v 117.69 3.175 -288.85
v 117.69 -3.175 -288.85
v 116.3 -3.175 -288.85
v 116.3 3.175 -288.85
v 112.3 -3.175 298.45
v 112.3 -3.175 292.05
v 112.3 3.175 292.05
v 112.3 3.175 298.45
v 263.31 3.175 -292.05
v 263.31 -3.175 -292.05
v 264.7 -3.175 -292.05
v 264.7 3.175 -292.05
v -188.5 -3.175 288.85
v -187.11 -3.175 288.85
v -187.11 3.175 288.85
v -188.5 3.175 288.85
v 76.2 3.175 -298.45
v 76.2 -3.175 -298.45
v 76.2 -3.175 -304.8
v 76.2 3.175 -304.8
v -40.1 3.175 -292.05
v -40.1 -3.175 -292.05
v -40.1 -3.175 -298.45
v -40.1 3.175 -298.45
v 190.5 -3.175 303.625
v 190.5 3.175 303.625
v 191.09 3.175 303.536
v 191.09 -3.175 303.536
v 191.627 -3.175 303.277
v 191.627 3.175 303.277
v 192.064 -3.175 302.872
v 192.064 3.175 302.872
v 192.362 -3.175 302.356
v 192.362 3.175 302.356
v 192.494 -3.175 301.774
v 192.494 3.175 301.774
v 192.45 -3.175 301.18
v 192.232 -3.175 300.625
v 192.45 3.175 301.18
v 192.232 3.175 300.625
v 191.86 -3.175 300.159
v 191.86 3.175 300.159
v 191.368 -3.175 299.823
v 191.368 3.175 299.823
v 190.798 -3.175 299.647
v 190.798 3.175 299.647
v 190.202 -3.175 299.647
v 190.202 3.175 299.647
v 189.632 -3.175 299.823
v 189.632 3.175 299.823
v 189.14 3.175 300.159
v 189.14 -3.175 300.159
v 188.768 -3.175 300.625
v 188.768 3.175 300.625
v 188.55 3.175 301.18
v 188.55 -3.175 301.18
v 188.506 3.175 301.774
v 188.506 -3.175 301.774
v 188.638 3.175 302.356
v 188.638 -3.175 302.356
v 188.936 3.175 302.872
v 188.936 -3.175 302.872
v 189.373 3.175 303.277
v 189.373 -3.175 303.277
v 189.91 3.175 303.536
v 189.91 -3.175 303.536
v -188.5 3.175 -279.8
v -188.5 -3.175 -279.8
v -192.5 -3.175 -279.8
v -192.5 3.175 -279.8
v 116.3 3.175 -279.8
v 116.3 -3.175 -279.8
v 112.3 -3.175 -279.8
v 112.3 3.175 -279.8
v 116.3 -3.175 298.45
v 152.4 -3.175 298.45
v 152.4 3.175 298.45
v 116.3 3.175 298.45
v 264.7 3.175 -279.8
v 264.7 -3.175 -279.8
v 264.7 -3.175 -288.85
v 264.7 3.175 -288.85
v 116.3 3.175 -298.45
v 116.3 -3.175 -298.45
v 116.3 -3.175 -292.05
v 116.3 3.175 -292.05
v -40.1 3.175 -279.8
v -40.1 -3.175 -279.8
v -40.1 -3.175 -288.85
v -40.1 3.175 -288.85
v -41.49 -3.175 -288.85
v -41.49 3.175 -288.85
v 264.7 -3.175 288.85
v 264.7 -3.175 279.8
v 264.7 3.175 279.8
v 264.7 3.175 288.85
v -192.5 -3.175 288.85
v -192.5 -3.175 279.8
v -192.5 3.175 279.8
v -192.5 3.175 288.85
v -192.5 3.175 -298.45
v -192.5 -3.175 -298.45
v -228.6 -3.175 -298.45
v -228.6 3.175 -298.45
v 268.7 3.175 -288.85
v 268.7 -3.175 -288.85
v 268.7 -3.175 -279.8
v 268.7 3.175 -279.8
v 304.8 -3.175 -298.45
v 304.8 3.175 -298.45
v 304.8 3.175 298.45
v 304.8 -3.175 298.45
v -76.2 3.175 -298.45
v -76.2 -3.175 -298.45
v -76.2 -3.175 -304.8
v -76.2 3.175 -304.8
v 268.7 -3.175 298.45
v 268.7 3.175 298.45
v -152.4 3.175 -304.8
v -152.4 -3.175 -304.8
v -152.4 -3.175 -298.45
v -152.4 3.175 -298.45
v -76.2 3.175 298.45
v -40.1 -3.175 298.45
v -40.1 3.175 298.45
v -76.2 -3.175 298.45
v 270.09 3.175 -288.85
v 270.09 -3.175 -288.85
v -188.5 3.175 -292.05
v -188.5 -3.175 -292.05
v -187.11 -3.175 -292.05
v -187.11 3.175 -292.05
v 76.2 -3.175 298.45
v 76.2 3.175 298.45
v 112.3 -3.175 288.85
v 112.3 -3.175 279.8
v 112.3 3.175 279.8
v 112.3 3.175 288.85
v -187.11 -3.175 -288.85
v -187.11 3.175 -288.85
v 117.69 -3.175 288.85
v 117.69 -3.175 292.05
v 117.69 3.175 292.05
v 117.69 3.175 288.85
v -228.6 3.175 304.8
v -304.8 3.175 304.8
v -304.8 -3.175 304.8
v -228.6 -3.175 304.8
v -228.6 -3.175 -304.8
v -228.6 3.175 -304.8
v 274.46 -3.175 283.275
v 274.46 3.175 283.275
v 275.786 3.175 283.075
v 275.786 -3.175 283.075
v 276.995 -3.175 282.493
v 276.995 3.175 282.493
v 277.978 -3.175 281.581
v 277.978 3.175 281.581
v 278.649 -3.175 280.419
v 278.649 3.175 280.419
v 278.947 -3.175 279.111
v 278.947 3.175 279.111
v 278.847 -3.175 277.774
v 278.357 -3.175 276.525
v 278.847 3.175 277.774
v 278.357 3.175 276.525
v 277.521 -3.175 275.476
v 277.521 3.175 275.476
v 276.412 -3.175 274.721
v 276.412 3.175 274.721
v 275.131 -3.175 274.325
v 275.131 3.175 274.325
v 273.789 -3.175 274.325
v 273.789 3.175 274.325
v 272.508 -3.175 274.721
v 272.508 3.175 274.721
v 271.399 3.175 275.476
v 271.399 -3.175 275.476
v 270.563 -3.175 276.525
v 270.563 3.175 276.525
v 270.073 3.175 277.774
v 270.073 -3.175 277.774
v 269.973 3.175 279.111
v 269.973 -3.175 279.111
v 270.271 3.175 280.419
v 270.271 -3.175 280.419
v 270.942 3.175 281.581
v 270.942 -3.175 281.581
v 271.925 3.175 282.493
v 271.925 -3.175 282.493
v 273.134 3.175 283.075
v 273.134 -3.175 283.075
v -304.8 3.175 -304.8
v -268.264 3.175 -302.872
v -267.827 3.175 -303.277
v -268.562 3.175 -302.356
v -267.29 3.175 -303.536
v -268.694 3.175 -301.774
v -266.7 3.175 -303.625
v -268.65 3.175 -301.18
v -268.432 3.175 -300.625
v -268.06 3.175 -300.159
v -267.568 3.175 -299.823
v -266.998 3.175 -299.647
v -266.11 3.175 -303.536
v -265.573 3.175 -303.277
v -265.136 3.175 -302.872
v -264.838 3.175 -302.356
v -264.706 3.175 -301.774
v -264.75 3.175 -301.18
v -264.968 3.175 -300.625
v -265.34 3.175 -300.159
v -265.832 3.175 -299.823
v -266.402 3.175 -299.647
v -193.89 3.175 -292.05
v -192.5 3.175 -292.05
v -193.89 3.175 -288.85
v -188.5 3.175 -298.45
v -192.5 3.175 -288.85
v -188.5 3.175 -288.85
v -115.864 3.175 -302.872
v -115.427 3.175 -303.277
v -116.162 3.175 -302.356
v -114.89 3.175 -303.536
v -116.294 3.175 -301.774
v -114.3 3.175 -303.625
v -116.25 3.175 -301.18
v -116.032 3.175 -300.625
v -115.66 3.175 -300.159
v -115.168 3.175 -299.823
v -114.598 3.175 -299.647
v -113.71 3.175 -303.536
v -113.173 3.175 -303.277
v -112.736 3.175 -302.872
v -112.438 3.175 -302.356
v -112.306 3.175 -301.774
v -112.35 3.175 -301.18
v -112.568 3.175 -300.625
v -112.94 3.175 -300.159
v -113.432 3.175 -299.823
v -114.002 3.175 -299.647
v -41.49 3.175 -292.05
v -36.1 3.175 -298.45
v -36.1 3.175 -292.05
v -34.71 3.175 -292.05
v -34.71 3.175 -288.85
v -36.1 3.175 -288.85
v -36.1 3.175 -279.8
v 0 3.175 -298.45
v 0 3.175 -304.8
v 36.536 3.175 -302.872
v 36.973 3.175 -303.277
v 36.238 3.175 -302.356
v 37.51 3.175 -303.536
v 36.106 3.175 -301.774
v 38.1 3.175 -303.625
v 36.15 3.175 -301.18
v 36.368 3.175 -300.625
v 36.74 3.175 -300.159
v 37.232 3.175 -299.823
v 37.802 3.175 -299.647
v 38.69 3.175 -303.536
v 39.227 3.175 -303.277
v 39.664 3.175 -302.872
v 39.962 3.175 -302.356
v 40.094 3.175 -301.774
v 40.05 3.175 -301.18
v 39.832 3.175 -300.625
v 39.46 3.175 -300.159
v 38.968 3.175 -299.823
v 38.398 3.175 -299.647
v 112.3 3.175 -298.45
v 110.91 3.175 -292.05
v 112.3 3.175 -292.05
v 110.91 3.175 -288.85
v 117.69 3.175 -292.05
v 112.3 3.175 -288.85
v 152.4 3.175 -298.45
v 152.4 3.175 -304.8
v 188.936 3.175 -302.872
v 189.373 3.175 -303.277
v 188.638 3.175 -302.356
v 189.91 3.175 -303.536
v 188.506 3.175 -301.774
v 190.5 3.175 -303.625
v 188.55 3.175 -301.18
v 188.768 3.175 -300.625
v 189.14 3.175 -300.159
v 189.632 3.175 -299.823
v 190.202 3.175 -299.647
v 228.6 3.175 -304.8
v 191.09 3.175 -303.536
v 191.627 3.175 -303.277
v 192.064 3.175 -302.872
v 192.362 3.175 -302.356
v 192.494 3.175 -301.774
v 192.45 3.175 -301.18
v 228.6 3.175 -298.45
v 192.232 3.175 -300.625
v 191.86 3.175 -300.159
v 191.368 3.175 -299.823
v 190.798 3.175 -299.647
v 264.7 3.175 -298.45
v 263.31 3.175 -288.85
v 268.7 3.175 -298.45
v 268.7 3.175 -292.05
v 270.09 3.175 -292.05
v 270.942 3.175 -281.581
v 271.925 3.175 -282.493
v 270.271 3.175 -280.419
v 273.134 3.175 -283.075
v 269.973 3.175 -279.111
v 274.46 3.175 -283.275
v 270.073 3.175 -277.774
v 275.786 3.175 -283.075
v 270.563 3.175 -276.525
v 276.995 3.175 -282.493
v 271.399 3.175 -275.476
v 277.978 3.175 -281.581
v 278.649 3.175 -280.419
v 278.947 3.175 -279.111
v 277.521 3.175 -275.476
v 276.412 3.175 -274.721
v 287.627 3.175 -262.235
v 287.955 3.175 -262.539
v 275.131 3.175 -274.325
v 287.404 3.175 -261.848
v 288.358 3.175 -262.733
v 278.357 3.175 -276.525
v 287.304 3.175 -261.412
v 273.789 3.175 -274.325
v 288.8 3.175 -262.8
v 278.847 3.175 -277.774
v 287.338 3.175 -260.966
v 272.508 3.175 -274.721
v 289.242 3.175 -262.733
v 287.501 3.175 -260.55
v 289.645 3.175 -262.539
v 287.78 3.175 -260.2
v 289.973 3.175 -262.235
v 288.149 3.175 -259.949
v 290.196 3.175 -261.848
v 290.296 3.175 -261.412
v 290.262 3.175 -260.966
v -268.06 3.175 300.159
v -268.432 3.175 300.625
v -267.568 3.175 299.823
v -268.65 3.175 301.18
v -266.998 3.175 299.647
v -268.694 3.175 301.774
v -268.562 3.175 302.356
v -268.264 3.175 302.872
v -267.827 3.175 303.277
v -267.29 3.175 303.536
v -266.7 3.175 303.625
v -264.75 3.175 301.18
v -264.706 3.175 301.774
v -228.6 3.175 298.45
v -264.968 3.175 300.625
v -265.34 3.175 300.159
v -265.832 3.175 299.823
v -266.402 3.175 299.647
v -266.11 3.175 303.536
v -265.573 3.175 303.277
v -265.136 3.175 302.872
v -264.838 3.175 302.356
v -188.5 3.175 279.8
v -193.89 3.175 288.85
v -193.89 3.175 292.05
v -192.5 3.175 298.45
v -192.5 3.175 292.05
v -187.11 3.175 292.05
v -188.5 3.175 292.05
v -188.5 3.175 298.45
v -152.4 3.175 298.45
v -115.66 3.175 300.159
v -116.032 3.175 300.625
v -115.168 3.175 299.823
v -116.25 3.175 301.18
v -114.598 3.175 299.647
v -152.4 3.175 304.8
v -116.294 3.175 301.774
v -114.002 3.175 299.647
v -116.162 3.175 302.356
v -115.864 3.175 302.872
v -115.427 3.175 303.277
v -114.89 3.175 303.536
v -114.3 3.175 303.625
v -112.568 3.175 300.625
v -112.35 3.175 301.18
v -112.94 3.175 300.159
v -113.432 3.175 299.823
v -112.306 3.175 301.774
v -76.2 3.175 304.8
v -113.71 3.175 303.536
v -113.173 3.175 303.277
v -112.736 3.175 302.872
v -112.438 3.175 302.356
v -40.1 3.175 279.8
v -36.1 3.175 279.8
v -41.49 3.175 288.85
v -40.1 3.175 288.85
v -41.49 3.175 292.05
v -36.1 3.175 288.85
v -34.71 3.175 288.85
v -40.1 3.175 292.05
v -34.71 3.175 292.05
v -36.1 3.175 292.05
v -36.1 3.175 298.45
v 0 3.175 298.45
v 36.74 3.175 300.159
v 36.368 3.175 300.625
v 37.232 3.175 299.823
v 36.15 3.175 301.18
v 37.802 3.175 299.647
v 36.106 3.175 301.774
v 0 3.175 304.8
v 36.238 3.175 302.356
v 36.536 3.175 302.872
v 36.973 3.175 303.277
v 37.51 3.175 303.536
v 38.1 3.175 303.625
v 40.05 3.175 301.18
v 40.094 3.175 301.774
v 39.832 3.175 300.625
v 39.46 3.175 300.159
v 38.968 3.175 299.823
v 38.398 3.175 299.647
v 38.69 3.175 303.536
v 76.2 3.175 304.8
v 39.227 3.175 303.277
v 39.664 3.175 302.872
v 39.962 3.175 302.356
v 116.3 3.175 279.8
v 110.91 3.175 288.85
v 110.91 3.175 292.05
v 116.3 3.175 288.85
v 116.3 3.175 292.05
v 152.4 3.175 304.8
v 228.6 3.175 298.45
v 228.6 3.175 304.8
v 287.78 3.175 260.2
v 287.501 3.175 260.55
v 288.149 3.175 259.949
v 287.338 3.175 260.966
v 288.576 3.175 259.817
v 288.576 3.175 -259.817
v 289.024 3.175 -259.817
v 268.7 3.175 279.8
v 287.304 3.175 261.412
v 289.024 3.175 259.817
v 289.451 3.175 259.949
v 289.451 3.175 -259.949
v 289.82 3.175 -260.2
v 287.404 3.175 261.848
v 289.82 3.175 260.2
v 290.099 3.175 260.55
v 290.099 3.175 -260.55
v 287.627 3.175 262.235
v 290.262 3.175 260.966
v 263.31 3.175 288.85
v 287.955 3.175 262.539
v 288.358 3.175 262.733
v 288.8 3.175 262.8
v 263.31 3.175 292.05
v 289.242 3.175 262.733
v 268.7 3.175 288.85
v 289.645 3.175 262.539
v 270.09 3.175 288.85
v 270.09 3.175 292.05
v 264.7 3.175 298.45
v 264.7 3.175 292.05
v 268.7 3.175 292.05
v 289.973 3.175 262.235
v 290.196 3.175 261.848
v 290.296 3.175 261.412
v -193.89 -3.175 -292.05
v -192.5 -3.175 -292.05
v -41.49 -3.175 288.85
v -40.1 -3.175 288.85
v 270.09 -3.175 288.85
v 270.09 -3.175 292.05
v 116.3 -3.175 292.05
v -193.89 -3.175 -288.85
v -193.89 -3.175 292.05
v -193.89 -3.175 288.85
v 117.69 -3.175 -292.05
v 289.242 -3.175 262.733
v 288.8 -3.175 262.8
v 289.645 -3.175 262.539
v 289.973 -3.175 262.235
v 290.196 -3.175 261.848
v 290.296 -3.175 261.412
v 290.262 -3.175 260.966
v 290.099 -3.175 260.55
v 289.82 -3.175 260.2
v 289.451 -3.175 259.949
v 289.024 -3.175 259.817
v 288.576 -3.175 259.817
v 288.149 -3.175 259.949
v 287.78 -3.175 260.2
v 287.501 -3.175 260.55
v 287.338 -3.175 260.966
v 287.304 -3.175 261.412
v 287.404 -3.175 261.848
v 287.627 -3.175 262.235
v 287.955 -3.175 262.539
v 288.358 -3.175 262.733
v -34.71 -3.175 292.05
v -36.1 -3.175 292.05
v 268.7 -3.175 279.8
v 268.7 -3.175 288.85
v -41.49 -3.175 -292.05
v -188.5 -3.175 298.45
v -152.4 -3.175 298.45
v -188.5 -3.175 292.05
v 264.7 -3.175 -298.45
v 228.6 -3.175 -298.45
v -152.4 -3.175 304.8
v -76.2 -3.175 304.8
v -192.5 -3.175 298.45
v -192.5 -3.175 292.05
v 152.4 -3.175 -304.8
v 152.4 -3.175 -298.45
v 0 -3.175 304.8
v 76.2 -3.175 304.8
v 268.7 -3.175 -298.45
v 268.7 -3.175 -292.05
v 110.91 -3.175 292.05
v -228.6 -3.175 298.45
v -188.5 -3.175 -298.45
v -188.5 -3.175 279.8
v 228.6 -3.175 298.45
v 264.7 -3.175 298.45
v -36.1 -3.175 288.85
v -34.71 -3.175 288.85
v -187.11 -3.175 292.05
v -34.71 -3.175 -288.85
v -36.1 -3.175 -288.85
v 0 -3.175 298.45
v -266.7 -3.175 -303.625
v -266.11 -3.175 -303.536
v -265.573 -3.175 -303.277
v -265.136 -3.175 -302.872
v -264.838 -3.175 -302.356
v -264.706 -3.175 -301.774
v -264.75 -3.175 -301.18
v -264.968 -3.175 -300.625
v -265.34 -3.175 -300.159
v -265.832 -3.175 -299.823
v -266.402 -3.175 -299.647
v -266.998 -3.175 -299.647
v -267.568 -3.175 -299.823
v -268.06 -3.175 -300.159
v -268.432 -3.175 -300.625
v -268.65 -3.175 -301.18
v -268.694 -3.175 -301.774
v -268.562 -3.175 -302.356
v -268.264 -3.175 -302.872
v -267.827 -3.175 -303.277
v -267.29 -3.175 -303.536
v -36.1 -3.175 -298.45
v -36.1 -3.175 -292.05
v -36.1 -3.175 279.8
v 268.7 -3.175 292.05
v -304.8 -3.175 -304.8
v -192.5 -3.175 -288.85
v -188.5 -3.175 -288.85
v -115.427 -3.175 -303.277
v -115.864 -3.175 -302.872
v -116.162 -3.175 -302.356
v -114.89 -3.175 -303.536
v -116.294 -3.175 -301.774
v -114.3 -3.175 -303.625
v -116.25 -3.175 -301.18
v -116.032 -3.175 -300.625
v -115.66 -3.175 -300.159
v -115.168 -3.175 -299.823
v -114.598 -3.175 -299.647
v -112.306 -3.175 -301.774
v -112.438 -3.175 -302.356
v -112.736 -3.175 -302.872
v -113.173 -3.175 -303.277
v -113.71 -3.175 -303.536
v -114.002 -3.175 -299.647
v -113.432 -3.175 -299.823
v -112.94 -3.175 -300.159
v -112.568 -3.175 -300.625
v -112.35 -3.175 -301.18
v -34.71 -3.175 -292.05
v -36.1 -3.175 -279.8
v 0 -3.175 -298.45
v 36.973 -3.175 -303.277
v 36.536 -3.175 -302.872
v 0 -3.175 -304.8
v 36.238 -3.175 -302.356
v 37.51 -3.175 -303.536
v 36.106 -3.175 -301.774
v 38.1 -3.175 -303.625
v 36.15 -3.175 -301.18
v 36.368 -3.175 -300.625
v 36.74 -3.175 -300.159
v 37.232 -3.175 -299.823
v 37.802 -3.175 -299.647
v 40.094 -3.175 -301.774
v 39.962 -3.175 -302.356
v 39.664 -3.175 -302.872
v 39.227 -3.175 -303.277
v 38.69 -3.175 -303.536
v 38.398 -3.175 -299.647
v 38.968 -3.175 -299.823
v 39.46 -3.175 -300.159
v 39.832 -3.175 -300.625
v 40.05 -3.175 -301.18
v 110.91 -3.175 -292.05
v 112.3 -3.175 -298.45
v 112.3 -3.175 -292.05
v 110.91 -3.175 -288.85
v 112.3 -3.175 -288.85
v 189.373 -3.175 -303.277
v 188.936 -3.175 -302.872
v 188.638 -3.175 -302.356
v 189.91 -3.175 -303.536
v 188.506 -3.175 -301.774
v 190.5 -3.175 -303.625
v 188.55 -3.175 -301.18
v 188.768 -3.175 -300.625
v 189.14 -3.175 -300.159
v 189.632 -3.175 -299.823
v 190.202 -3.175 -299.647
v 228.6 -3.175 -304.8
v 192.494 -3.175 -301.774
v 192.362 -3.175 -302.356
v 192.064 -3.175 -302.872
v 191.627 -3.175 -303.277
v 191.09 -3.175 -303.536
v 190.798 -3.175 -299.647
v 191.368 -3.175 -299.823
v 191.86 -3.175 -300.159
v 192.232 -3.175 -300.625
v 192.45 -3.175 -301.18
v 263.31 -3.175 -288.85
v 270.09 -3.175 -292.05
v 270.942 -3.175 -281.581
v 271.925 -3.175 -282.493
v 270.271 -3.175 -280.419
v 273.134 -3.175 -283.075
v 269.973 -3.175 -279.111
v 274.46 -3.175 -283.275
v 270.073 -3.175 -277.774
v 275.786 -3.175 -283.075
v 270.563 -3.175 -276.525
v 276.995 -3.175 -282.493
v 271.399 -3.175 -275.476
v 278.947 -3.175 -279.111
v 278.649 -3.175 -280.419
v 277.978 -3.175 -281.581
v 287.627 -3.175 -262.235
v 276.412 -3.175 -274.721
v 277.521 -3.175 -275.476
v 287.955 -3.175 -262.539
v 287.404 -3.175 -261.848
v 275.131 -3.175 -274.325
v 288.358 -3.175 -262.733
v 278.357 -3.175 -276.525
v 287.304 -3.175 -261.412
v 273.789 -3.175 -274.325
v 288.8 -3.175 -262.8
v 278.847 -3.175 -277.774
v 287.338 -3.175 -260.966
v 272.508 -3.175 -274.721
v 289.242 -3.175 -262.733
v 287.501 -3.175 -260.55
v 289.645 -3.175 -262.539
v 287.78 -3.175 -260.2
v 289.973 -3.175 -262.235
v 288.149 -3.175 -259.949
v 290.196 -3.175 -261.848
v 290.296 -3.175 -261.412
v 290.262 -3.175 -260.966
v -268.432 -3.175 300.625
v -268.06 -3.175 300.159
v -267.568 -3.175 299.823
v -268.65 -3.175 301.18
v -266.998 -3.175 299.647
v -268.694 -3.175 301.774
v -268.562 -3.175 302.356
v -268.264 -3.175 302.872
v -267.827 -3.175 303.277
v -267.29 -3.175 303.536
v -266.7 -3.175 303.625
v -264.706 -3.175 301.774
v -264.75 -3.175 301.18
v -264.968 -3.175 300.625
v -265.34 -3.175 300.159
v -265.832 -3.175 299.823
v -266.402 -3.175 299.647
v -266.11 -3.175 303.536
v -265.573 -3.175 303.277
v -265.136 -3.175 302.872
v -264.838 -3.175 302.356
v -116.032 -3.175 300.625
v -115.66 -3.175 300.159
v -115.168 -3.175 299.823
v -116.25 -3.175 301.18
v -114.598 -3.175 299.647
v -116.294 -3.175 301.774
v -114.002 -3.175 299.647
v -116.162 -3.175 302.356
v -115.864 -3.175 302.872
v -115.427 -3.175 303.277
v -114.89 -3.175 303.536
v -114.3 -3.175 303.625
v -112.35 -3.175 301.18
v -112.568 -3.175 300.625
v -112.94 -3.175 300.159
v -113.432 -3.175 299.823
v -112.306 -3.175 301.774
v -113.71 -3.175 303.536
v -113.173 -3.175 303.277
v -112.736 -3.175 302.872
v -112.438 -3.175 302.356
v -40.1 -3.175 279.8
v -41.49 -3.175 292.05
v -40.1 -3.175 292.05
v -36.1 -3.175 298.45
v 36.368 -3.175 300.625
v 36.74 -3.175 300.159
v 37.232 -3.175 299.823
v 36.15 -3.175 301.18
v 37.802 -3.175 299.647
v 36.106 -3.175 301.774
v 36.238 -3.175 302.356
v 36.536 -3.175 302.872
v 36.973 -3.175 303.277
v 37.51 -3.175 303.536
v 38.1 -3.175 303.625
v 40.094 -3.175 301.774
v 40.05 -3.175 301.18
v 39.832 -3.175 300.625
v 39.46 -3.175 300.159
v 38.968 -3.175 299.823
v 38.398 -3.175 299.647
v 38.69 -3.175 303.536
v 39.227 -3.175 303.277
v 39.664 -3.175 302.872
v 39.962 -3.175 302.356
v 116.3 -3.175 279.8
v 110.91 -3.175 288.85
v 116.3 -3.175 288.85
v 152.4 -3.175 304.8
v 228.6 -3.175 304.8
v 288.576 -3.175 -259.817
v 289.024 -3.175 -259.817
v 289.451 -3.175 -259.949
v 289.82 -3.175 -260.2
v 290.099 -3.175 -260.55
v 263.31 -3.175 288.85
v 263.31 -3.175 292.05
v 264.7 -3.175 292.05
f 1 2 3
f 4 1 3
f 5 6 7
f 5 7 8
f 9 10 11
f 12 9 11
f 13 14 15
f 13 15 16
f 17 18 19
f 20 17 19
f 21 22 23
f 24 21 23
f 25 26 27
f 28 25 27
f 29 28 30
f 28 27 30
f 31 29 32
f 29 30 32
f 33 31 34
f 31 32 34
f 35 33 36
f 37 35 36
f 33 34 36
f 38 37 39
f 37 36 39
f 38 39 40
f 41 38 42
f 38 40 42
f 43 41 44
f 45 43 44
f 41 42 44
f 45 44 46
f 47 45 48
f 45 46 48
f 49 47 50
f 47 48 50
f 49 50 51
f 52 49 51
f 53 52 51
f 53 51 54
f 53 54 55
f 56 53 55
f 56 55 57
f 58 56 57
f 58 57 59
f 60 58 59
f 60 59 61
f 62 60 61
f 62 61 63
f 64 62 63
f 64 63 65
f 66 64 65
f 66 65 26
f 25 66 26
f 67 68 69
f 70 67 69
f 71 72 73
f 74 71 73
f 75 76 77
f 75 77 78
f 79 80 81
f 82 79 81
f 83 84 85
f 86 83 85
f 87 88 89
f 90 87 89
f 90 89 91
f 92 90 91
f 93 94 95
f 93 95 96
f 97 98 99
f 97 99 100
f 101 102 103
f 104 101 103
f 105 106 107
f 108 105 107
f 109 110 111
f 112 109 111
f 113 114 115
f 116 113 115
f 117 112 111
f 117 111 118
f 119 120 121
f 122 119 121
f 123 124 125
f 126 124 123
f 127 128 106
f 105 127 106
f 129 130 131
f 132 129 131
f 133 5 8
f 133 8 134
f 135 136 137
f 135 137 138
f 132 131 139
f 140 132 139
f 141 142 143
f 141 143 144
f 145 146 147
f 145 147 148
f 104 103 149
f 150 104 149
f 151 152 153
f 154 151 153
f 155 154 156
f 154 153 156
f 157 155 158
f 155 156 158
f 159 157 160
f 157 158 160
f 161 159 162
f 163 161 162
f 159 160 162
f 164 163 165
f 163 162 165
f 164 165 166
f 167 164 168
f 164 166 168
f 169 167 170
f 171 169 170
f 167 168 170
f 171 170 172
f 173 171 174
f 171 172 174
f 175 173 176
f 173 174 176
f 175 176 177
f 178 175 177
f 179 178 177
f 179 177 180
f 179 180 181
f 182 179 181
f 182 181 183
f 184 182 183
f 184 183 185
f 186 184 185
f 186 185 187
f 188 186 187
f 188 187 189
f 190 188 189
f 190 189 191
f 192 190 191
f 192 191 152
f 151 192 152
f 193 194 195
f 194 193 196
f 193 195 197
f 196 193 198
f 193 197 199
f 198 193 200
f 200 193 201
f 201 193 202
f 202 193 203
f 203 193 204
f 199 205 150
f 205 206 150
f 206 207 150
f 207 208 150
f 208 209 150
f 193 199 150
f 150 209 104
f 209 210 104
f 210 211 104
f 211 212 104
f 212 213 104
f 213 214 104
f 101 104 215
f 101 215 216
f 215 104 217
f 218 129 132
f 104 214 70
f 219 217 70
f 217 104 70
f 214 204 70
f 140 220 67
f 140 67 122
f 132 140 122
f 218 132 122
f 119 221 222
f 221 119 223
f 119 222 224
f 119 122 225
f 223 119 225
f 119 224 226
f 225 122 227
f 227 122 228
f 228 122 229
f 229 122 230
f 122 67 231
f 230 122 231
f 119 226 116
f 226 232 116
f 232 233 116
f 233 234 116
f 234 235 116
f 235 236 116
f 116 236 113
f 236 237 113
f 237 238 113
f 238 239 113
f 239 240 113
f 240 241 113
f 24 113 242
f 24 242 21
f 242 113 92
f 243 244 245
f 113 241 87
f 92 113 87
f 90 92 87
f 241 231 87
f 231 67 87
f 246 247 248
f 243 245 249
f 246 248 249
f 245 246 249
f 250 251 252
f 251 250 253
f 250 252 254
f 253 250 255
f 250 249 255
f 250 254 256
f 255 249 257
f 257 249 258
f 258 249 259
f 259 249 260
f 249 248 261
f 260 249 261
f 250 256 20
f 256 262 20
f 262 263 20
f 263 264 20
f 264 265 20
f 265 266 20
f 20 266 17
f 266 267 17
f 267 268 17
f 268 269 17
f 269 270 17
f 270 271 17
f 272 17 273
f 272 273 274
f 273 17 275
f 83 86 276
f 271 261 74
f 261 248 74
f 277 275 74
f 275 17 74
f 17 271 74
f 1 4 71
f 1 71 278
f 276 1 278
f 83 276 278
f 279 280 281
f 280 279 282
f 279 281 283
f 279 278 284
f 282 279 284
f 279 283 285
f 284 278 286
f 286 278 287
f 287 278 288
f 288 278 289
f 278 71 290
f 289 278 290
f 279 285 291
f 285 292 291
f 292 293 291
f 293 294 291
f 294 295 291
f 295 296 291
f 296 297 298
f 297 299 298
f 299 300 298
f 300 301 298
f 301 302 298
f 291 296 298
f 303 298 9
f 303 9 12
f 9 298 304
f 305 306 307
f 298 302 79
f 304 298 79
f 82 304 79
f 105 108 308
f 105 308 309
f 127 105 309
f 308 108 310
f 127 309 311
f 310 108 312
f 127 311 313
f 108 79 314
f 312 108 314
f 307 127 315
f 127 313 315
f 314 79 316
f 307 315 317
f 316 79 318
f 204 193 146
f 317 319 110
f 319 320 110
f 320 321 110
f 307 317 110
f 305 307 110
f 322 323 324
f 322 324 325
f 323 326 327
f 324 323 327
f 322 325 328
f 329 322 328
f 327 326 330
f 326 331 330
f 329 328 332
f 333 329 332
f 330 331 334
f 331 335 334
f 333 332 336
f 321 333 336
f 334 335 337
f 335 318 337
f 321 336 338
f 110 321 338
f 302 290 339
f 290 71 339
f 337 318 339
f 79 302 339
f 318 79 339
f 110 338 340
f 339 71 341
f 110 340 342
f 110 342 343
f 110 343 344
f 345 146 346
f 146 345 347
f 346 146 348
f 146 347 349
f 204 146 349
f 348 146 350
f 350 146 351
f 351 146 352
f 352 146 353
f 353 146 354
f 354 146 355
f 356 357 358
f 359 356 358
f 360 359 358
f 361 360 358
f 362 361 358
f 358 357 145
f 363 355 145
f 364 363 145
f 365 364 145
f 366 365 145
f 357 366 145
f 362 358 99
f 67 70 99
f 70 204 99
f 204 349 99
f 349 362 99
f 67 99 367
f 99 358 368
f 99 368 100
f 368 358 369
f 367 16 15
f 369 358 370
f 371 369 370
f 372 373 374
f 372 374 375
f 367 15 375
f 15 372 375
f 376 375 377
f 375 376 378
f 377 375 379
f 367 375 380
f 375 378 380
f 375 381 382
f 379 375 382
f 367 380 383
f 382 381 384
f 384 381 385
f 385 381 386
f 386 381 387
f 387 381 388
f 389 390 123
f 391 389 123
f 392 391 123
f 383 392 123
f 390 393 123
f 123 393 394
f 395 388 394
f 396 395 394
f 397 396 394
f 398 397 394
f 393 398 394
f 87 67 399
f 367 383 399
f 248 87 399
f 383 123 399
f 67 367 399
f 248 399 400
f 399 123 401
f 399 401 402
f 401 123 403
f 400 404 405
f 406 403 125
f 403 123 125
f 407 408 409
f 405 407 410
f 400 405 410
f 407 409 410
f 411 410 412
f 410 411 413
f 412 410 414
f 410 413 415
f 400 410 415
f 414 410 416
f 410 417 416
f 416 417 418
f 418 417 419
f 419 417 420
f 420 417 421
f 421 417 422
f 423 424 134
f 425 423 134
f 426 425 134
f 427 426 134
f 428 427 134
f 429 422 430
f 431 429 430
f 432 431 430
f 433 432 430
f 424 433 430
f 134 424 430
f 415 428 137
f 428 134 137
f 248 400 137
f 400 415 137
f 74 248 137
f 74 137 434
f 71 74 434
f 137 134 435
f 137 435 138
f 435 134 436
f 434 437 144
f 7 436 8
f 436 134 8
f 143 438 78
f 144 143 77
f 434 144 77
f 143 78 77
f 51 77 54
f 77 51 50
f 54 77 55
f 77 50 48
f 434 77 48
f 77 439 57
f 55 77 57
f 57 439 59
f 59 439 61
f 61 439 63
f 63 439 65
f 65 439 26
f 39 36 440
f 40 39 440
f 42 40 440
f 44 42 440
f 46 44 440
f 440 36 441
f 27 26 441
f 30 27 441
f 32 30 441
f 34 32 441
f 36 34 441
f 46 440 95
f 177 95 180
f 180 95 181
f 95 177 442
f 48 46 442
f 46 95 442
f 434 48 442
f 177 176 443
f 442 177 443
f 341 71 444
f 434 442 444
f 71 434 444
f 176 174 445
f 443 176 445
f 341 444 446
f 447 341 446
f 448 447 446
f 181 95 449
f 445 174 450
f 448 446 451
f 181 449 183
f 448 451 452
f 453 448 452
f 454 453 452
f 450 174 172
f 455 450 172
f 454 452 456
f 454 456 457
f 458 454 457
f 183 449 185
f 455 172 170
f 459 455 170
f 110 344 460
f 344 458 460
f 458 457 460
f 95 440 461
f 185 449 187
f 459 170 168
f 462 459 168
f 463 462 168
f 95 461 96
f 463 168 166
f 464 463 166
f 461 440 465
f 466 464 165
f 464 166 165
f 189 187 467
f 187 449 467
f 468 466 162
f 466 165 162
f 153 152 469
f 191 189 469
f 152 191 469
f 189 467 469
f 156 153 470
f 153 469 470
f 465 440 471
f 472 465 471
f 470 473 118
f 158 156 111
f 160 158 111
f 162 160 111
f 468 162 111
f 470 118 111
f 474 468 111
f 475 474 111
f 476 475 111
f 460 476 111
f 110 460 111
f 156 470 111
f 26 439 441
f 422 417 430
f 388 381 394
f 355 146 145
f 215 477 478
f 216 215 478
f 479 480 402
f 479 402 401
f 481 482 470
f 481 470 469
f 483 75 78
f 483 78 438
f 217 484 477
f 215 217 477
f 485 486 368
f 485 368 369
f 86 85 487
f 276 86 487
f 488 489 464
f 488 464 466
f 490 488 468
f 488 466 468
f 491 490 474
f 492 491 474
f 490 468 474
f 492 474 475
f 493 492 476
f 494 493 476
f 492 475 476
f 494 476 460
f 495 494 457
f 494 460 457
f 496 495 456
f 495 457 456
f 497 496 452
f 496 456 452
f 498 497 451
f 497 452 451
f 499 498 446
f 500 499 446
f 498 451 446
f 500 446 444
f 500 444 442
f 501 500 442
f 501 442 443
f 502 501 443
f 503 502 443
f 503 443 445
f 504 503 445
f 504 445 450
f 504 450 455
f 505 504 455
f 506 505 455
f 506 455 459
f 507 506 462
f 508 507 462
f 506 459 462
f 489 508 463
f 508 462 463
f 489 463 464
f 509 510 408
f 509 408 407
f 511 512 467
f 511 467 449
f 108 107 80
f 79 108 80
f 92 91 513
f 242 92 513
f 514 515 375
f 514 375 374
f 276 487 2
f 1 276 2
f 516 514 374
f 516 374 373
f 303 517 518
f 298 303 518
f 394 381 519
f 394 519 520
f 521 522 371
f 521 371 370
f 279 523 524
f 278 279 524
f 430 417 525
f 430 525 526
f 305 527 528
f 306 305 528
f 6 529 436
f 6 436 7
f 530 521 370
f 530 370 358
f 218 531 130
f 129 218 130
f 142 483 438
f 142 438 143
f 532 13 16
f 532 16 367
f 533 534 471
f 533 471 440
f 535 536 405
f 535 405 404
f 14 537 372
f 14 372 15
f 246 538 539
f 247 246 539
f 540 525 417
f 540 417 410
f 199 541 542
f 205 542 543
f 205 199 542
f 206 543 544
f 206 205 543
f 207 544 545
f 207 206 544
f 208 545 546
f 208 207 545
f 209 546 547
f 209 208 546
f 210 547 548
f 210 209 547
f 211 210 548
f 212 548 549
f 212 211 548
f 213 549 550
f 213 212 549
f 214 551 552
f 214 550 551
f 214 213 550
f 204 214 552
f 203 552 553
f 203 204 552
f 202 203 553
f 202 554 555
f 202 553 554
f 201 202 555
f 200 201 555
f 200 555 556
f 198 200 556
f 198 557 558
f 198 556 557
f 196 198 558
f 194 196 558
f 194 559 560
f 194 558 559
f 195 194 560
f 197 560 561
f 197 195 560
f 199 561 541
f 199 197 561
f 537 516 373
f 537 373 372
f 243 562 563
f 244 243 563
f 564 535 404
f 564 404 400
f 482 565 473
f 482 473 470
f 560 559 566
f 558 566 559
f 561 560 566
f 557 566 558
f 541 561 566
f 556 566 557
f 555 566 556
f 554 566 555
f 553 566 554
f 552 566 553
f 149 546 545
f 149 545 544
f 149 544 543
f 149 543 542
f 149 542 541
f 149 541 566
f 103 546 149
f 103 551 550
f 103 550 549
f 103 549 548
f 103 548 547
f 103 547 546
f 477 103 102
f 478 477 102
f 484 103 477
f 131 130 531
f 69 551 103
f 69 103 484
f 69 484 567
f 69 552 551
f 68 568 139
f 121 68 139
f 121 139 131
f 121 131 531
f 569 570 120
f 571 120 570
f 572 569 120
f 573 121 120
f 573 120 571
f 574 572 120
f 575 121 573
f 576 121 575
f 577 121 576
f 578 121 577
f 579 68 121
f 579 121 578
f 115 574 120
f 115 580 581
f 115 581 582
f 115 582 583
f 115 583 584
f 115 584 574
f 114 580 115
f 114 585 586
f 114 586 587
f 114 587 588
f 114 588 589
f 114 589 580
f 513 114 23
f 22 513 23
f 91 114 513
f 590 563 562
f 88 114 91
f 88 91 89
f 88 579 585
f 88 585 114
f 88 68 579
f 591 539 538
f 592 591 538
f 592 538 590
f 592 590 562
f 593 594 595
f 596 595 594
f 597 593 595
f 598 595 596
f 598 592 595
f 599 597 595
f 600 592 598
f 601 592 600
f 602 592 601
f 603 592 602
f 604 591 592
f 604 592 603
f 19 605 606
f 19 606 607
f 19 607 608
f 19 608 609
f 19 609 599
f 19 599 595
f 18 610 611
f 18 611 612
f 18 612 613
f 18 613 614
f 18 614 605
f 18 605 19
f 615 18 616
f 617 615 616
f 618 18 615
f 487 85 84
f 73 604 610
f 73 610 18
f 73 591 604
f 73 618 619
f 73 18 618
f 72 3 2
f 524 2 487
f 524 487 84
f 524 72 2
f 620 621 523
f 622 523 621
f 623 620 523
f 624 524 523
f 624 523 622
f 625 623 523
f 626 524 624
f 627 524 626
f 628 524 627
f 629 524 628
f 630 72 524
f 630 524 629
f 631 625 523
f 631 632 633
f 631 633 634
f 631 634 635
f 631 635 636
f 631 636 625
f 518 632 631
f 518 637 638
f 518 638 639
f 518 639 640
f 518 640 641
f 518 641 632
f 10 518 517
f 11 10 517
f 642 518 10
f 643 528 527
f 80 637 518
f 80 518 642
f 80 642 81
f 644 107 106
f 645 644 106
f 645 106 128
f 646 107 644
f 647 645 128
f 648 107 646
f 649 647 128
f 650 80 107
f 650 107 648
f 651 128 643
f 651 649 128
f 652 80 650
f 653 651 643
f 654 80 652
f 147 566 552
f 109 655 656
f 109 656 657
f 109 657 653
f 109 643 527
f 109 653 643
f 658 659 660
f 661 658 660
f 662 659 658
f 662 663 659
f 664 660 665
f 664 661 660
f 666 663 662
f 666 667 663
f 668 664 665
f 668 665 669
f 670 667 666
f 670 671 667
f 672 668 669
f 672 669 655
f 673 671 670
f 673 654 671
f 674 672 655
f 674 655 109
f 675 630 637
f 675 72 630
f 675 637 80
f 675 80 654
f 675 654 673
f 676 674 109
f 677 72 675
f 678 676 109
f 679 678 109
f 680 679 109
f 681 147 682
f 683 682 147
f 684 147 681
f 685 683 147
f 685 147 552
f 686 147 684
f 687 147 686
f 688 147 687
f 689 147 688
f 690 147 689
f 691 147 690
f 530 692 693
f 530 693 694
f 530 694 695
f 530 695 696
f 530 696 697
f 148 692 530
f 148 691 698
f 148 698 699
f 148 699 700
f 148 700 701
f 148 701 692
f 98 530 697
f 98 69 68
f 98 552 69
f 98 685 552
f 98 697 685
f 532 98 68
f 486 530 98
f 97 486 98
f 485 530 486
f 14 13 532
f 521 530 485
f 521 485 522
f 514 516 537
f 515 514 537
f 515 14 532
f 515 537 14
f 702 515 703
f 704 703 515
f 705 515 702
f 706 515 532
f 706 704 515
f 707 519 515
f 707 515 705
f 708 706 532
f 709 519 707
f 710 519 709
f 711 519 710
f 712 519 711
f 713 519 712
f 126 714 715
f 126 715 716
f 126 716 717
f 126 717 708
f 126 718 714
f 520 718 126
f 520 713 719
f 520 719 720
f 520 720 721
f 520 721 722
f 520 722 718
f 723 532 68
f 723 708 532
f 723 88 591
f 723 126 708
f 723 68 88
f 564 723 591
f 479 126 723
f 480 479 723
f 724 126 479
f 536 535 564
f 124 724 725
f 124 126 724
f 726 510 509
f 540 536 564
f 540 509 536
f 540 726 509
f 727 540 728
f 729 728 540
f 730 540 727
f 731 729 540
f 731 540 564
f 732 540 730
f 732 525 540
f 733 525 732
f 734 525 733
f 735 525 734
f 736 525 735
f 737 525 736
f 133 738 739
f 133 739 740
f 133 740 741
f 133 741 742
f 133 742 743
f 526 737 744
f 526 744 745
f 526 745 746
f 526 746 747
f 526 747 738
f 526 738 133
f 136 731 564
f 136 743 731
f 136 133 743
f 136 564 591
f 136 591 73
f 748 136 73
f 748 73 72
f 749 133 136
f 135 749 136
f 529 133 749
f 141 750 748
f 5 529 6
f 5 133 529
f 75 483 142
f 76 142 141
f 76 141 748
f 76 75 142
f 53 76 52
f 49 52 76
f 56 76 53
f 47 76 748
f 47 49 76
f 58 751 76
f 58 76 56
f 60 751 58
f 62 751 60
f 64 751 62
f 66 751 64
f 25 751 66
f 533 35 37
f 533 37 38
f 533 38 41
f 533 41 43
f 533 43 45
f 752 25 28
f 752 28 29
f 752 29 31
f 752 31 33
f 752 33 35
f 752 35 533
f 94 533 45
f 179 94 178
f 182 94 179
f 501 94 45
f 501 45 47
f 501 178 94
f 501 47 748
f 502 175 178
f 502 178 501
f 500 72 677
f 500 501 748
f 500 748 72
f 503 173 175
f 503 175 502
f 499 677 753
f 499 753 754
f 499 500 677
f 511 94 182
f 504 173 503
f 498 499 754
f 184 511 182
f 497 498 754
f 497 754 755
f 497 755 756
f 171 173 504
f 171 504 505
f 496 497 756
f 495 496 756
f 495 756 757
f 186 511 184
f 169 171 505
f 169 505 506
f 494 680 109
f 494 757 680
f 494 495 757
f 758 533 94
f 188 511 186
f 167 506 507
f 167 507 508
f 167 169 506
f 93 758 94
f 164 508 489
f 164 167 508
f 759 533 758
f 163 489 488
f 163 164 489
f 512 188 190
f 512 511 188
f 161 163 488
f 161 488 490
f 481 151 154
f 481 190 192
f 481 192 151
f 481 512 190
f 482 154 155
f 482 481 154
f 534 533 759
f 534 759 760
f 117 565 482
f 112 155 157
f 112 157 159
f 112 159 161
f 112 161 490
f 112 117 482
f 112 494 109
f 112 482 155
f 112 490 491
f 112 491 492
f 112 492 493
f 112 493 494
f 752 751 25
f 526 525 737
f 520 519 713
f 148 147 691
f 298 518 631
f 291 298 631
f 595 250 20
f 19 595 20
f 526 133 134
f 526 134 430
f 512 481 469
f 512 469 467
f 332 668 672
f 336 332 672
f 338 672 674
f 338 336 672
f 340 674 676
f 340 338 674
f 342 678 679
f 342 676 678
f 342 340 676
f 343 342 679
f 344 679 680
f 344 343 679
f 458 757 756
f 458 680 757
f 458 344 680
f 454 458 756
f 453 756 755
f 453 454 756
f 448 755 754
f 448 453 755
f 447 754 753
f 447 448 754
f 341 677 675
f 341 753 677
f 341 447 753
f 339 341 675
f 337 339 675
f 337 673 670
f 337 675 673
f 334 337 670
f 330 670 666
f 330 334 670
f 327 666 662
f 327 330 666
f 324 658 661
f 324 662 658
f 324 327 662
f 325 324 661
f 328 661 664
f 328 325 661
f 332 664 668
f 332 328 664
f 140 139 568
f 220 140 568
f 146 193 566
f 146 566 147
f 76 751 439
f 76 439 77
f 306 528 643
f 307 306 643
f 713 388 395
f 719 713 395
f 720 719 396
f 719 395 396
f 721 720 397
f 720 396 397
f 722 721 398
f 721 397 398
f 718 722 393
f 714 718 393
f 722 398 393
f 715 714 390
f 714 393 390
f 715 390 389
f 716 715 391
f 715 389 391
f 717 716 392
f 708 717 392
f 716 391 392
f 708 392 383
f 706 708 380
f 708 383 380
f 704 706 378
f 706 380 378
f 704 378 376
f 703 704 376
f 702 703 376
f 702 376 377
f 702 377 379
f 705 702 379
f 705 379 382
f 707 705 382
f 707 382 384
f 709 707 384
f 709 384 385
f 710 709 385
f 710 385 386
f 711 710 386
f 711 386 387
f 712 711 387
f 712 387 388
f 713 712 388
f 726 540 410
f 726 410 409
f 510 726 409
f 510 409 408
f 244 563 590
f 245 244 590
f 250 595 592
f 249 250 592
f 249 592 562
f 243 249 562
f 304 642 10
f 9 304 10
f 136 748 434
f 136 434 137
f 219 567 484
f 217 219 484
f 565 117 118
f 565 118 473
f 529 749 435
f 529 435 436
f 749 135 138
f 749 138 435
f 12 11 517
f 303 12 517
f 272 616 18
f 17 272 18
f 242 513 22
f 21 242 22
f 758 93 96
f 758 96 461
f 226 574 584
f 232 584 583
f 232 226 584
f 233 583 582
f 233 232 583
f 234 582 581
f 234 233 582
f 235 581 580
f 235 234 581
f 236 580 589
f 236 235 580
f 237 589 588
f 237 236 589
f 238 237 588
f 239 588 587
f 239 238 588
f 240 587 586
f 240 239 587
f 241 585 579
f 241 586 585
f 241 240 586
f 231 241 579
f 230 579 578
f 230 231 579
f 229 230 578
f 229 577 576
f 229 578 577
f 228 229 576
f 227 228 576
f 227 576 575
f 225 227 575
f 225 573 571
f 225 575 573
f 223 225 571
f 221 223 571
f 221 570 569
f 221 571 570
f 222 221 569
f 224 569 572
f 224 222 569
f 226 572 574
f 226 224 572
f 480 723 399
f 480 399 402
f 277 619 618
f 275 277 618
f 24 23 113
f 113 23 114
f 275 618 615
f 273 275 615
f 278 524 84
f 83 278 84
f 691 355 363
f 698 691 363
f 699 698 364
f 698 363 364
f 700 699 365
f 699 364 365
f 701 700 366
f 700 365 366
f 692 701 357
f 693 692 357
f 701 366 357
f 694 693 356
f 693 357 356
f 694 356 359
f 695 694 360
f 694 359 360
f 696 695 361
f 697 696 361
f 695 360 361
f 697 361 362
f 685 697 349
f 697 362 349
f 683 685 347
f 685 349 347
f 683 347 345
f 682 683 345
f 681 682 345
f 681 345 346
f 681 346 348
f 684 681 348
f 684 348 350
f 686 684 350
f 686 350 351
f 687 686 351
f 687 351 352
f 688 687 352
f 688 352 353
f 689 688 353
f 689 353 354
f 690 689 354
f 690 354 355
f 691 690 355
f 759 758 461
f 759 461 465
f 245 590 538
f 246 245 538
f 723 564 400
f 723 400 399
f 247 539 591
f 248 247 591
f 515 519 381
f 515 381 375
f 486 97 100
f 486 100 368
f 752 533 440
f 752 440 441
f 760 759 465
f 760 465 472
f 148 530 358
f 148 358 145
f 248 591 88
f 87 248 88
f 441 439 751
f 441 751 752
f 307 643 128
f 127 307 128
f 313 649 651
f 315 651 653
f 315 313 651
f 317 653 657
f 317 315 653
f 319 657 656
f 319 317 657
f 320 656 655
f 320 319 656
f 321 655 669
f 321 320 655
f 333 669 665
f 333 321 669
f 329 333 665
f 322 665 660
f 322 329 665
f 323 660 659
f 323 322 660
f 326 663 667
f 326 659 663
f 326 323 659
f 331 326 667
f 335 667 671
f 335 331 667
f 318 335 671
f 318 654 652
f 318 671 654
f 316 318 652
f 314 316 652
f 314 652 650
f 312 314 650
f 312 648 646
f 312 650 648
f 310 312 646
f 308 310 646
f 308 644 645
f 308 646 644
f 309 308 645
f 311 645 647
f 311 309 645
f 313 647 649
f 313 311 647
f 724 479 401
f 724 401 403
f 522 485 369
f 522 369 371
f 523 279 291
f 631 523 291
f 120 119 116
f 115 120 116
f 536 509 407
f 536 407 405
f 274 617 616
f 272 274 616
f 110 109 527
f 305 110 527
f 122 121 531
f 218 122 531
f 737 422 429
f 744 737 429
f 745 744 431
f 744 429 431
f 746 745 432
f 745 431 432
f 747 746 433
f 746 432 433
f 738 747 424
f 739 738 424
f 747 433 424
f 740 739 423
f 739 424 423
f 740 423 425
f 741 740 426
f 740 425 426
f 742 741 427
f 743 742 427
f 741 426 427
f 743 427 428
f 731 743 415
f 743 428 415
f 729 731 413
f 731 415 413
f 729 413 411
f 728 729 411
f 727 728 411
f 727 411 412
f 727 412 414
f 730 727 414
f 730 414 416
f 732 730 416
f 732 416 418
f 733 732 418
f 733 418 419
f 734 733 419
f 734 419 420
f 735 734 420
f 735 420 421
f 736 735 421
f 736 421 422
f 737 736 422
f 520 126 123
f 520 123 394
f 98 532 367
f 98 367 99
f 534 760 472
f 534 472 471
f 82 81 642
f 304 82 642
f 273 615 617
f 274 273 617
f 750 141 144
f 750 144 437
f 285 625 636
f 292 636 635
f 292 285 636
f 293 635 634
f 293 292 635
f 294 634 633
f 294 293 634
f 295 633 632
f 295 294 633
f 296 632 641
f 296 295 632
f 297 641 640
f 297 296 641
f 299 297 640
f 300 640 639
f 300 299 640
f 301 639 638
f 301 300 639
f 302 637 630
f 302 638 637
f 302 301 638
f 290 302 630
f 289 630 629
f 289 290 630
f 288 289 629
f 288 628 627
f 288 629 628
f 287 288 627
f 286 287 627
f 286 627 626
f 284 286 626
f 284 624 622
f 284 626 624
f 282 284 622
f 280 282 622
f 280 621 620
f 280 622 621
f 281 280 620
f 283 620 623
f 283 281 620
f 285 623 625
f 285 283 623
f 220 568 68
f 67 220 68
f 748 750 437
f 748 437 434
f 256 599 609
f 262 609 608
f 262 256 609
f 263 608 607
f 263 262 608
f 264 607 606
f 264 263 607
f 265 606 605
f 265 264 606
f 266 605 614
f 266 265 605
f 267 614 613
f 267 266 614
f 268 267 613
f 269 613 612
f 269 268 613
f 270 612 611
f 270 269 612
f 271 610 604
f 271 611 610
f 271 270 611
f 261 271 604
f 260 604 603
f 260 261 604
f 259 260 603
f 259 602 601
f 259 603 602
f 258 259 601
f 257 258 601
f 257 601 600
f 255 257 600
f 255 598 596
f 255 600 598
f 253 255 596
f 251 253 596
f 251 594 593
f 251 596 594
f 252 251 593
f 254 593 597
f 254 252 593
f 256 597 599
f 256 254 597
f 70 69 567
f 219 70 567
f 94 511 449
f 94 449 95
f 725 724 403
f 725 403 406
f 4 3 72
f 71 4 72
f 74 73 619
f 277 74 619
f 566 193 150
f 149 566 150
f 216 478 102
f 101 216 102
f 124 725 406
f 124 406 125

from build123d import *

# Parameters (mm, degrees)
SKETCH1_W           = 609.6
SKETCH1_H           = 304.8
BOSS_EXTRUDE1_DEPTH = 3.175
SKETCH2_R           = 2
SKETCH2_R_2         = 4.5
SKETCH2_R_3         = 1.5
CUT_EXTRUDE1_DEPTH  = 432.099063441


with BuildPart() as part:
    # Sketch1 → Boss-Extrude1 (new, symmetric)
    with BuildSketch(Plane(origin=(0, 0, 0), x_dir=(1, 0, 0), z_dir=(0, 1, 0))):
        with Locations((0, -152.4)):
            Rectangle(SKETCH1_W, SKETCH1_H)
    boss_extrude1 = extrude(amount=BOSS_EXTRUDE1_DEPTH, both=True)

    # Sketch2 → Cut-Extrude1 (cut, symmetric)
    with BuildSketch(Plane(origin=(0, 3.175, 0), x_dir=(1, 0, 0), z_dir=(0, 1, 0))):
        with Locations(Location((-266.7, -301.625, 0), (0, 0, 270))):
            Circle(SKETCH2_R)
        Polygon((-228.6, -298.45), (-228.6, -304.8), (-152.4, -304.8), (-152.4, -298.45), (-188.5, -298.45), (-192.5, -298.45), align=None)
        Polygon((-192.5, -292.05), (-192.5, -298.45), (-188.5, -298.45), (-188.5, -292.05), (-187.11, -292.05), (-187.11, -288.85), (-188.5, -288.85), (-188.5, -279.8), (-192.5, -279.8), (-192.5, -288.85), (-193.89, -288.85), (-193.89, -292.05), align=None)
        with Locations(Location((-114.3, -301.625, 0), (0, 0, 270))):
            Circle(SKETCH2_R)
        Polygon((-76.2, -298.45), (-76.2, -304.8), (0, -304.8), (0, -298.45), (-36.1, -298.45), (-40.1, -298.45), align=None)
        Polygon((-40.1, -292.05), (-40.1, -298.45), (-36.1, -298.45), (-36.1, -292.05), (-34.71, -292.05), (-34.71, -288.85), (-36.1, -288.85), (-36.1, -279.8), (-40.1, -279.8), (-40.1, -288.85), (-41.49, -288.85), (-41.49, -292.05), align=None)
        with Locations(Location((38.1, -301.625, 0), (0, 0, 270))):
            Circle(SKETCH2_R)
        Polygon((76.2, -298.45), (76.2, -304.8), (152.4, -304.8), (152.4, -298.45), (116.3, -298.45), (112.3, -298.45), align=None)
        Polygon((112.3, -292.05), (112.3, -298.45), (116.3, -298.45), (116.3, -292.05), (117.69, -292.05), (117.69, -288.85), (116.3, -288.85), (116.3, -279.8), (112.3, -279.8), (112.3, -288.85), (110.91, -288.85), (110.91, -292.05), align=None)
        with Locations(Location((190.5, -301.625, 0), (0, 0, 270))):
            Circle(SKETCH2_R)
        Polygon((228.6, -298.45), (228.6, -304.8), (304.8, -304.8), (304.8, -298.45), (268.7, -298.45), (264.7, -298.45), align=None)
        Polygon((264.7, -292.05), (264.7, -298.45), (268.7, -298.45), (268.7, -292.05), (270.09, -292.05), (270.09, -288.85), (268.7, -288.85), (268.7, -279.8), (264.7, -279.8), (264.7, -288.85), (263.31, -288.85), (263.31, -292.05), align=None)
        with Locations(Location((274.46, -278.775, 0), (0, 0, 270))):
            Circle(SKETCH2_R_2)
        with Locations(Location((288.8, -261.3, 0), (0, 0, 270))):
            Circle(SKETCH2_R_3)
    cut_extrude1 = extrude(amount=CUT_EXTRUDE1_DEPTH, both=True, mode=Mode.SUBTRACT)

    # Mirror1: Boss-Extrude1, Cut-Extrude1 across plane
    add(boss_extrude1.mirror(Plane(origin=(0, 3.175, 0), x_dir=(1, 0, 0), z_dir=(0, 0, -1))))
    add(cut_extrude1.mirror(Plane(origin=(0, 3.175, 0), x_dir=(1, 0, 0), z_dir=(0, 0, -1))), mode=Mode.SUBTRACT)


solid = part.part
